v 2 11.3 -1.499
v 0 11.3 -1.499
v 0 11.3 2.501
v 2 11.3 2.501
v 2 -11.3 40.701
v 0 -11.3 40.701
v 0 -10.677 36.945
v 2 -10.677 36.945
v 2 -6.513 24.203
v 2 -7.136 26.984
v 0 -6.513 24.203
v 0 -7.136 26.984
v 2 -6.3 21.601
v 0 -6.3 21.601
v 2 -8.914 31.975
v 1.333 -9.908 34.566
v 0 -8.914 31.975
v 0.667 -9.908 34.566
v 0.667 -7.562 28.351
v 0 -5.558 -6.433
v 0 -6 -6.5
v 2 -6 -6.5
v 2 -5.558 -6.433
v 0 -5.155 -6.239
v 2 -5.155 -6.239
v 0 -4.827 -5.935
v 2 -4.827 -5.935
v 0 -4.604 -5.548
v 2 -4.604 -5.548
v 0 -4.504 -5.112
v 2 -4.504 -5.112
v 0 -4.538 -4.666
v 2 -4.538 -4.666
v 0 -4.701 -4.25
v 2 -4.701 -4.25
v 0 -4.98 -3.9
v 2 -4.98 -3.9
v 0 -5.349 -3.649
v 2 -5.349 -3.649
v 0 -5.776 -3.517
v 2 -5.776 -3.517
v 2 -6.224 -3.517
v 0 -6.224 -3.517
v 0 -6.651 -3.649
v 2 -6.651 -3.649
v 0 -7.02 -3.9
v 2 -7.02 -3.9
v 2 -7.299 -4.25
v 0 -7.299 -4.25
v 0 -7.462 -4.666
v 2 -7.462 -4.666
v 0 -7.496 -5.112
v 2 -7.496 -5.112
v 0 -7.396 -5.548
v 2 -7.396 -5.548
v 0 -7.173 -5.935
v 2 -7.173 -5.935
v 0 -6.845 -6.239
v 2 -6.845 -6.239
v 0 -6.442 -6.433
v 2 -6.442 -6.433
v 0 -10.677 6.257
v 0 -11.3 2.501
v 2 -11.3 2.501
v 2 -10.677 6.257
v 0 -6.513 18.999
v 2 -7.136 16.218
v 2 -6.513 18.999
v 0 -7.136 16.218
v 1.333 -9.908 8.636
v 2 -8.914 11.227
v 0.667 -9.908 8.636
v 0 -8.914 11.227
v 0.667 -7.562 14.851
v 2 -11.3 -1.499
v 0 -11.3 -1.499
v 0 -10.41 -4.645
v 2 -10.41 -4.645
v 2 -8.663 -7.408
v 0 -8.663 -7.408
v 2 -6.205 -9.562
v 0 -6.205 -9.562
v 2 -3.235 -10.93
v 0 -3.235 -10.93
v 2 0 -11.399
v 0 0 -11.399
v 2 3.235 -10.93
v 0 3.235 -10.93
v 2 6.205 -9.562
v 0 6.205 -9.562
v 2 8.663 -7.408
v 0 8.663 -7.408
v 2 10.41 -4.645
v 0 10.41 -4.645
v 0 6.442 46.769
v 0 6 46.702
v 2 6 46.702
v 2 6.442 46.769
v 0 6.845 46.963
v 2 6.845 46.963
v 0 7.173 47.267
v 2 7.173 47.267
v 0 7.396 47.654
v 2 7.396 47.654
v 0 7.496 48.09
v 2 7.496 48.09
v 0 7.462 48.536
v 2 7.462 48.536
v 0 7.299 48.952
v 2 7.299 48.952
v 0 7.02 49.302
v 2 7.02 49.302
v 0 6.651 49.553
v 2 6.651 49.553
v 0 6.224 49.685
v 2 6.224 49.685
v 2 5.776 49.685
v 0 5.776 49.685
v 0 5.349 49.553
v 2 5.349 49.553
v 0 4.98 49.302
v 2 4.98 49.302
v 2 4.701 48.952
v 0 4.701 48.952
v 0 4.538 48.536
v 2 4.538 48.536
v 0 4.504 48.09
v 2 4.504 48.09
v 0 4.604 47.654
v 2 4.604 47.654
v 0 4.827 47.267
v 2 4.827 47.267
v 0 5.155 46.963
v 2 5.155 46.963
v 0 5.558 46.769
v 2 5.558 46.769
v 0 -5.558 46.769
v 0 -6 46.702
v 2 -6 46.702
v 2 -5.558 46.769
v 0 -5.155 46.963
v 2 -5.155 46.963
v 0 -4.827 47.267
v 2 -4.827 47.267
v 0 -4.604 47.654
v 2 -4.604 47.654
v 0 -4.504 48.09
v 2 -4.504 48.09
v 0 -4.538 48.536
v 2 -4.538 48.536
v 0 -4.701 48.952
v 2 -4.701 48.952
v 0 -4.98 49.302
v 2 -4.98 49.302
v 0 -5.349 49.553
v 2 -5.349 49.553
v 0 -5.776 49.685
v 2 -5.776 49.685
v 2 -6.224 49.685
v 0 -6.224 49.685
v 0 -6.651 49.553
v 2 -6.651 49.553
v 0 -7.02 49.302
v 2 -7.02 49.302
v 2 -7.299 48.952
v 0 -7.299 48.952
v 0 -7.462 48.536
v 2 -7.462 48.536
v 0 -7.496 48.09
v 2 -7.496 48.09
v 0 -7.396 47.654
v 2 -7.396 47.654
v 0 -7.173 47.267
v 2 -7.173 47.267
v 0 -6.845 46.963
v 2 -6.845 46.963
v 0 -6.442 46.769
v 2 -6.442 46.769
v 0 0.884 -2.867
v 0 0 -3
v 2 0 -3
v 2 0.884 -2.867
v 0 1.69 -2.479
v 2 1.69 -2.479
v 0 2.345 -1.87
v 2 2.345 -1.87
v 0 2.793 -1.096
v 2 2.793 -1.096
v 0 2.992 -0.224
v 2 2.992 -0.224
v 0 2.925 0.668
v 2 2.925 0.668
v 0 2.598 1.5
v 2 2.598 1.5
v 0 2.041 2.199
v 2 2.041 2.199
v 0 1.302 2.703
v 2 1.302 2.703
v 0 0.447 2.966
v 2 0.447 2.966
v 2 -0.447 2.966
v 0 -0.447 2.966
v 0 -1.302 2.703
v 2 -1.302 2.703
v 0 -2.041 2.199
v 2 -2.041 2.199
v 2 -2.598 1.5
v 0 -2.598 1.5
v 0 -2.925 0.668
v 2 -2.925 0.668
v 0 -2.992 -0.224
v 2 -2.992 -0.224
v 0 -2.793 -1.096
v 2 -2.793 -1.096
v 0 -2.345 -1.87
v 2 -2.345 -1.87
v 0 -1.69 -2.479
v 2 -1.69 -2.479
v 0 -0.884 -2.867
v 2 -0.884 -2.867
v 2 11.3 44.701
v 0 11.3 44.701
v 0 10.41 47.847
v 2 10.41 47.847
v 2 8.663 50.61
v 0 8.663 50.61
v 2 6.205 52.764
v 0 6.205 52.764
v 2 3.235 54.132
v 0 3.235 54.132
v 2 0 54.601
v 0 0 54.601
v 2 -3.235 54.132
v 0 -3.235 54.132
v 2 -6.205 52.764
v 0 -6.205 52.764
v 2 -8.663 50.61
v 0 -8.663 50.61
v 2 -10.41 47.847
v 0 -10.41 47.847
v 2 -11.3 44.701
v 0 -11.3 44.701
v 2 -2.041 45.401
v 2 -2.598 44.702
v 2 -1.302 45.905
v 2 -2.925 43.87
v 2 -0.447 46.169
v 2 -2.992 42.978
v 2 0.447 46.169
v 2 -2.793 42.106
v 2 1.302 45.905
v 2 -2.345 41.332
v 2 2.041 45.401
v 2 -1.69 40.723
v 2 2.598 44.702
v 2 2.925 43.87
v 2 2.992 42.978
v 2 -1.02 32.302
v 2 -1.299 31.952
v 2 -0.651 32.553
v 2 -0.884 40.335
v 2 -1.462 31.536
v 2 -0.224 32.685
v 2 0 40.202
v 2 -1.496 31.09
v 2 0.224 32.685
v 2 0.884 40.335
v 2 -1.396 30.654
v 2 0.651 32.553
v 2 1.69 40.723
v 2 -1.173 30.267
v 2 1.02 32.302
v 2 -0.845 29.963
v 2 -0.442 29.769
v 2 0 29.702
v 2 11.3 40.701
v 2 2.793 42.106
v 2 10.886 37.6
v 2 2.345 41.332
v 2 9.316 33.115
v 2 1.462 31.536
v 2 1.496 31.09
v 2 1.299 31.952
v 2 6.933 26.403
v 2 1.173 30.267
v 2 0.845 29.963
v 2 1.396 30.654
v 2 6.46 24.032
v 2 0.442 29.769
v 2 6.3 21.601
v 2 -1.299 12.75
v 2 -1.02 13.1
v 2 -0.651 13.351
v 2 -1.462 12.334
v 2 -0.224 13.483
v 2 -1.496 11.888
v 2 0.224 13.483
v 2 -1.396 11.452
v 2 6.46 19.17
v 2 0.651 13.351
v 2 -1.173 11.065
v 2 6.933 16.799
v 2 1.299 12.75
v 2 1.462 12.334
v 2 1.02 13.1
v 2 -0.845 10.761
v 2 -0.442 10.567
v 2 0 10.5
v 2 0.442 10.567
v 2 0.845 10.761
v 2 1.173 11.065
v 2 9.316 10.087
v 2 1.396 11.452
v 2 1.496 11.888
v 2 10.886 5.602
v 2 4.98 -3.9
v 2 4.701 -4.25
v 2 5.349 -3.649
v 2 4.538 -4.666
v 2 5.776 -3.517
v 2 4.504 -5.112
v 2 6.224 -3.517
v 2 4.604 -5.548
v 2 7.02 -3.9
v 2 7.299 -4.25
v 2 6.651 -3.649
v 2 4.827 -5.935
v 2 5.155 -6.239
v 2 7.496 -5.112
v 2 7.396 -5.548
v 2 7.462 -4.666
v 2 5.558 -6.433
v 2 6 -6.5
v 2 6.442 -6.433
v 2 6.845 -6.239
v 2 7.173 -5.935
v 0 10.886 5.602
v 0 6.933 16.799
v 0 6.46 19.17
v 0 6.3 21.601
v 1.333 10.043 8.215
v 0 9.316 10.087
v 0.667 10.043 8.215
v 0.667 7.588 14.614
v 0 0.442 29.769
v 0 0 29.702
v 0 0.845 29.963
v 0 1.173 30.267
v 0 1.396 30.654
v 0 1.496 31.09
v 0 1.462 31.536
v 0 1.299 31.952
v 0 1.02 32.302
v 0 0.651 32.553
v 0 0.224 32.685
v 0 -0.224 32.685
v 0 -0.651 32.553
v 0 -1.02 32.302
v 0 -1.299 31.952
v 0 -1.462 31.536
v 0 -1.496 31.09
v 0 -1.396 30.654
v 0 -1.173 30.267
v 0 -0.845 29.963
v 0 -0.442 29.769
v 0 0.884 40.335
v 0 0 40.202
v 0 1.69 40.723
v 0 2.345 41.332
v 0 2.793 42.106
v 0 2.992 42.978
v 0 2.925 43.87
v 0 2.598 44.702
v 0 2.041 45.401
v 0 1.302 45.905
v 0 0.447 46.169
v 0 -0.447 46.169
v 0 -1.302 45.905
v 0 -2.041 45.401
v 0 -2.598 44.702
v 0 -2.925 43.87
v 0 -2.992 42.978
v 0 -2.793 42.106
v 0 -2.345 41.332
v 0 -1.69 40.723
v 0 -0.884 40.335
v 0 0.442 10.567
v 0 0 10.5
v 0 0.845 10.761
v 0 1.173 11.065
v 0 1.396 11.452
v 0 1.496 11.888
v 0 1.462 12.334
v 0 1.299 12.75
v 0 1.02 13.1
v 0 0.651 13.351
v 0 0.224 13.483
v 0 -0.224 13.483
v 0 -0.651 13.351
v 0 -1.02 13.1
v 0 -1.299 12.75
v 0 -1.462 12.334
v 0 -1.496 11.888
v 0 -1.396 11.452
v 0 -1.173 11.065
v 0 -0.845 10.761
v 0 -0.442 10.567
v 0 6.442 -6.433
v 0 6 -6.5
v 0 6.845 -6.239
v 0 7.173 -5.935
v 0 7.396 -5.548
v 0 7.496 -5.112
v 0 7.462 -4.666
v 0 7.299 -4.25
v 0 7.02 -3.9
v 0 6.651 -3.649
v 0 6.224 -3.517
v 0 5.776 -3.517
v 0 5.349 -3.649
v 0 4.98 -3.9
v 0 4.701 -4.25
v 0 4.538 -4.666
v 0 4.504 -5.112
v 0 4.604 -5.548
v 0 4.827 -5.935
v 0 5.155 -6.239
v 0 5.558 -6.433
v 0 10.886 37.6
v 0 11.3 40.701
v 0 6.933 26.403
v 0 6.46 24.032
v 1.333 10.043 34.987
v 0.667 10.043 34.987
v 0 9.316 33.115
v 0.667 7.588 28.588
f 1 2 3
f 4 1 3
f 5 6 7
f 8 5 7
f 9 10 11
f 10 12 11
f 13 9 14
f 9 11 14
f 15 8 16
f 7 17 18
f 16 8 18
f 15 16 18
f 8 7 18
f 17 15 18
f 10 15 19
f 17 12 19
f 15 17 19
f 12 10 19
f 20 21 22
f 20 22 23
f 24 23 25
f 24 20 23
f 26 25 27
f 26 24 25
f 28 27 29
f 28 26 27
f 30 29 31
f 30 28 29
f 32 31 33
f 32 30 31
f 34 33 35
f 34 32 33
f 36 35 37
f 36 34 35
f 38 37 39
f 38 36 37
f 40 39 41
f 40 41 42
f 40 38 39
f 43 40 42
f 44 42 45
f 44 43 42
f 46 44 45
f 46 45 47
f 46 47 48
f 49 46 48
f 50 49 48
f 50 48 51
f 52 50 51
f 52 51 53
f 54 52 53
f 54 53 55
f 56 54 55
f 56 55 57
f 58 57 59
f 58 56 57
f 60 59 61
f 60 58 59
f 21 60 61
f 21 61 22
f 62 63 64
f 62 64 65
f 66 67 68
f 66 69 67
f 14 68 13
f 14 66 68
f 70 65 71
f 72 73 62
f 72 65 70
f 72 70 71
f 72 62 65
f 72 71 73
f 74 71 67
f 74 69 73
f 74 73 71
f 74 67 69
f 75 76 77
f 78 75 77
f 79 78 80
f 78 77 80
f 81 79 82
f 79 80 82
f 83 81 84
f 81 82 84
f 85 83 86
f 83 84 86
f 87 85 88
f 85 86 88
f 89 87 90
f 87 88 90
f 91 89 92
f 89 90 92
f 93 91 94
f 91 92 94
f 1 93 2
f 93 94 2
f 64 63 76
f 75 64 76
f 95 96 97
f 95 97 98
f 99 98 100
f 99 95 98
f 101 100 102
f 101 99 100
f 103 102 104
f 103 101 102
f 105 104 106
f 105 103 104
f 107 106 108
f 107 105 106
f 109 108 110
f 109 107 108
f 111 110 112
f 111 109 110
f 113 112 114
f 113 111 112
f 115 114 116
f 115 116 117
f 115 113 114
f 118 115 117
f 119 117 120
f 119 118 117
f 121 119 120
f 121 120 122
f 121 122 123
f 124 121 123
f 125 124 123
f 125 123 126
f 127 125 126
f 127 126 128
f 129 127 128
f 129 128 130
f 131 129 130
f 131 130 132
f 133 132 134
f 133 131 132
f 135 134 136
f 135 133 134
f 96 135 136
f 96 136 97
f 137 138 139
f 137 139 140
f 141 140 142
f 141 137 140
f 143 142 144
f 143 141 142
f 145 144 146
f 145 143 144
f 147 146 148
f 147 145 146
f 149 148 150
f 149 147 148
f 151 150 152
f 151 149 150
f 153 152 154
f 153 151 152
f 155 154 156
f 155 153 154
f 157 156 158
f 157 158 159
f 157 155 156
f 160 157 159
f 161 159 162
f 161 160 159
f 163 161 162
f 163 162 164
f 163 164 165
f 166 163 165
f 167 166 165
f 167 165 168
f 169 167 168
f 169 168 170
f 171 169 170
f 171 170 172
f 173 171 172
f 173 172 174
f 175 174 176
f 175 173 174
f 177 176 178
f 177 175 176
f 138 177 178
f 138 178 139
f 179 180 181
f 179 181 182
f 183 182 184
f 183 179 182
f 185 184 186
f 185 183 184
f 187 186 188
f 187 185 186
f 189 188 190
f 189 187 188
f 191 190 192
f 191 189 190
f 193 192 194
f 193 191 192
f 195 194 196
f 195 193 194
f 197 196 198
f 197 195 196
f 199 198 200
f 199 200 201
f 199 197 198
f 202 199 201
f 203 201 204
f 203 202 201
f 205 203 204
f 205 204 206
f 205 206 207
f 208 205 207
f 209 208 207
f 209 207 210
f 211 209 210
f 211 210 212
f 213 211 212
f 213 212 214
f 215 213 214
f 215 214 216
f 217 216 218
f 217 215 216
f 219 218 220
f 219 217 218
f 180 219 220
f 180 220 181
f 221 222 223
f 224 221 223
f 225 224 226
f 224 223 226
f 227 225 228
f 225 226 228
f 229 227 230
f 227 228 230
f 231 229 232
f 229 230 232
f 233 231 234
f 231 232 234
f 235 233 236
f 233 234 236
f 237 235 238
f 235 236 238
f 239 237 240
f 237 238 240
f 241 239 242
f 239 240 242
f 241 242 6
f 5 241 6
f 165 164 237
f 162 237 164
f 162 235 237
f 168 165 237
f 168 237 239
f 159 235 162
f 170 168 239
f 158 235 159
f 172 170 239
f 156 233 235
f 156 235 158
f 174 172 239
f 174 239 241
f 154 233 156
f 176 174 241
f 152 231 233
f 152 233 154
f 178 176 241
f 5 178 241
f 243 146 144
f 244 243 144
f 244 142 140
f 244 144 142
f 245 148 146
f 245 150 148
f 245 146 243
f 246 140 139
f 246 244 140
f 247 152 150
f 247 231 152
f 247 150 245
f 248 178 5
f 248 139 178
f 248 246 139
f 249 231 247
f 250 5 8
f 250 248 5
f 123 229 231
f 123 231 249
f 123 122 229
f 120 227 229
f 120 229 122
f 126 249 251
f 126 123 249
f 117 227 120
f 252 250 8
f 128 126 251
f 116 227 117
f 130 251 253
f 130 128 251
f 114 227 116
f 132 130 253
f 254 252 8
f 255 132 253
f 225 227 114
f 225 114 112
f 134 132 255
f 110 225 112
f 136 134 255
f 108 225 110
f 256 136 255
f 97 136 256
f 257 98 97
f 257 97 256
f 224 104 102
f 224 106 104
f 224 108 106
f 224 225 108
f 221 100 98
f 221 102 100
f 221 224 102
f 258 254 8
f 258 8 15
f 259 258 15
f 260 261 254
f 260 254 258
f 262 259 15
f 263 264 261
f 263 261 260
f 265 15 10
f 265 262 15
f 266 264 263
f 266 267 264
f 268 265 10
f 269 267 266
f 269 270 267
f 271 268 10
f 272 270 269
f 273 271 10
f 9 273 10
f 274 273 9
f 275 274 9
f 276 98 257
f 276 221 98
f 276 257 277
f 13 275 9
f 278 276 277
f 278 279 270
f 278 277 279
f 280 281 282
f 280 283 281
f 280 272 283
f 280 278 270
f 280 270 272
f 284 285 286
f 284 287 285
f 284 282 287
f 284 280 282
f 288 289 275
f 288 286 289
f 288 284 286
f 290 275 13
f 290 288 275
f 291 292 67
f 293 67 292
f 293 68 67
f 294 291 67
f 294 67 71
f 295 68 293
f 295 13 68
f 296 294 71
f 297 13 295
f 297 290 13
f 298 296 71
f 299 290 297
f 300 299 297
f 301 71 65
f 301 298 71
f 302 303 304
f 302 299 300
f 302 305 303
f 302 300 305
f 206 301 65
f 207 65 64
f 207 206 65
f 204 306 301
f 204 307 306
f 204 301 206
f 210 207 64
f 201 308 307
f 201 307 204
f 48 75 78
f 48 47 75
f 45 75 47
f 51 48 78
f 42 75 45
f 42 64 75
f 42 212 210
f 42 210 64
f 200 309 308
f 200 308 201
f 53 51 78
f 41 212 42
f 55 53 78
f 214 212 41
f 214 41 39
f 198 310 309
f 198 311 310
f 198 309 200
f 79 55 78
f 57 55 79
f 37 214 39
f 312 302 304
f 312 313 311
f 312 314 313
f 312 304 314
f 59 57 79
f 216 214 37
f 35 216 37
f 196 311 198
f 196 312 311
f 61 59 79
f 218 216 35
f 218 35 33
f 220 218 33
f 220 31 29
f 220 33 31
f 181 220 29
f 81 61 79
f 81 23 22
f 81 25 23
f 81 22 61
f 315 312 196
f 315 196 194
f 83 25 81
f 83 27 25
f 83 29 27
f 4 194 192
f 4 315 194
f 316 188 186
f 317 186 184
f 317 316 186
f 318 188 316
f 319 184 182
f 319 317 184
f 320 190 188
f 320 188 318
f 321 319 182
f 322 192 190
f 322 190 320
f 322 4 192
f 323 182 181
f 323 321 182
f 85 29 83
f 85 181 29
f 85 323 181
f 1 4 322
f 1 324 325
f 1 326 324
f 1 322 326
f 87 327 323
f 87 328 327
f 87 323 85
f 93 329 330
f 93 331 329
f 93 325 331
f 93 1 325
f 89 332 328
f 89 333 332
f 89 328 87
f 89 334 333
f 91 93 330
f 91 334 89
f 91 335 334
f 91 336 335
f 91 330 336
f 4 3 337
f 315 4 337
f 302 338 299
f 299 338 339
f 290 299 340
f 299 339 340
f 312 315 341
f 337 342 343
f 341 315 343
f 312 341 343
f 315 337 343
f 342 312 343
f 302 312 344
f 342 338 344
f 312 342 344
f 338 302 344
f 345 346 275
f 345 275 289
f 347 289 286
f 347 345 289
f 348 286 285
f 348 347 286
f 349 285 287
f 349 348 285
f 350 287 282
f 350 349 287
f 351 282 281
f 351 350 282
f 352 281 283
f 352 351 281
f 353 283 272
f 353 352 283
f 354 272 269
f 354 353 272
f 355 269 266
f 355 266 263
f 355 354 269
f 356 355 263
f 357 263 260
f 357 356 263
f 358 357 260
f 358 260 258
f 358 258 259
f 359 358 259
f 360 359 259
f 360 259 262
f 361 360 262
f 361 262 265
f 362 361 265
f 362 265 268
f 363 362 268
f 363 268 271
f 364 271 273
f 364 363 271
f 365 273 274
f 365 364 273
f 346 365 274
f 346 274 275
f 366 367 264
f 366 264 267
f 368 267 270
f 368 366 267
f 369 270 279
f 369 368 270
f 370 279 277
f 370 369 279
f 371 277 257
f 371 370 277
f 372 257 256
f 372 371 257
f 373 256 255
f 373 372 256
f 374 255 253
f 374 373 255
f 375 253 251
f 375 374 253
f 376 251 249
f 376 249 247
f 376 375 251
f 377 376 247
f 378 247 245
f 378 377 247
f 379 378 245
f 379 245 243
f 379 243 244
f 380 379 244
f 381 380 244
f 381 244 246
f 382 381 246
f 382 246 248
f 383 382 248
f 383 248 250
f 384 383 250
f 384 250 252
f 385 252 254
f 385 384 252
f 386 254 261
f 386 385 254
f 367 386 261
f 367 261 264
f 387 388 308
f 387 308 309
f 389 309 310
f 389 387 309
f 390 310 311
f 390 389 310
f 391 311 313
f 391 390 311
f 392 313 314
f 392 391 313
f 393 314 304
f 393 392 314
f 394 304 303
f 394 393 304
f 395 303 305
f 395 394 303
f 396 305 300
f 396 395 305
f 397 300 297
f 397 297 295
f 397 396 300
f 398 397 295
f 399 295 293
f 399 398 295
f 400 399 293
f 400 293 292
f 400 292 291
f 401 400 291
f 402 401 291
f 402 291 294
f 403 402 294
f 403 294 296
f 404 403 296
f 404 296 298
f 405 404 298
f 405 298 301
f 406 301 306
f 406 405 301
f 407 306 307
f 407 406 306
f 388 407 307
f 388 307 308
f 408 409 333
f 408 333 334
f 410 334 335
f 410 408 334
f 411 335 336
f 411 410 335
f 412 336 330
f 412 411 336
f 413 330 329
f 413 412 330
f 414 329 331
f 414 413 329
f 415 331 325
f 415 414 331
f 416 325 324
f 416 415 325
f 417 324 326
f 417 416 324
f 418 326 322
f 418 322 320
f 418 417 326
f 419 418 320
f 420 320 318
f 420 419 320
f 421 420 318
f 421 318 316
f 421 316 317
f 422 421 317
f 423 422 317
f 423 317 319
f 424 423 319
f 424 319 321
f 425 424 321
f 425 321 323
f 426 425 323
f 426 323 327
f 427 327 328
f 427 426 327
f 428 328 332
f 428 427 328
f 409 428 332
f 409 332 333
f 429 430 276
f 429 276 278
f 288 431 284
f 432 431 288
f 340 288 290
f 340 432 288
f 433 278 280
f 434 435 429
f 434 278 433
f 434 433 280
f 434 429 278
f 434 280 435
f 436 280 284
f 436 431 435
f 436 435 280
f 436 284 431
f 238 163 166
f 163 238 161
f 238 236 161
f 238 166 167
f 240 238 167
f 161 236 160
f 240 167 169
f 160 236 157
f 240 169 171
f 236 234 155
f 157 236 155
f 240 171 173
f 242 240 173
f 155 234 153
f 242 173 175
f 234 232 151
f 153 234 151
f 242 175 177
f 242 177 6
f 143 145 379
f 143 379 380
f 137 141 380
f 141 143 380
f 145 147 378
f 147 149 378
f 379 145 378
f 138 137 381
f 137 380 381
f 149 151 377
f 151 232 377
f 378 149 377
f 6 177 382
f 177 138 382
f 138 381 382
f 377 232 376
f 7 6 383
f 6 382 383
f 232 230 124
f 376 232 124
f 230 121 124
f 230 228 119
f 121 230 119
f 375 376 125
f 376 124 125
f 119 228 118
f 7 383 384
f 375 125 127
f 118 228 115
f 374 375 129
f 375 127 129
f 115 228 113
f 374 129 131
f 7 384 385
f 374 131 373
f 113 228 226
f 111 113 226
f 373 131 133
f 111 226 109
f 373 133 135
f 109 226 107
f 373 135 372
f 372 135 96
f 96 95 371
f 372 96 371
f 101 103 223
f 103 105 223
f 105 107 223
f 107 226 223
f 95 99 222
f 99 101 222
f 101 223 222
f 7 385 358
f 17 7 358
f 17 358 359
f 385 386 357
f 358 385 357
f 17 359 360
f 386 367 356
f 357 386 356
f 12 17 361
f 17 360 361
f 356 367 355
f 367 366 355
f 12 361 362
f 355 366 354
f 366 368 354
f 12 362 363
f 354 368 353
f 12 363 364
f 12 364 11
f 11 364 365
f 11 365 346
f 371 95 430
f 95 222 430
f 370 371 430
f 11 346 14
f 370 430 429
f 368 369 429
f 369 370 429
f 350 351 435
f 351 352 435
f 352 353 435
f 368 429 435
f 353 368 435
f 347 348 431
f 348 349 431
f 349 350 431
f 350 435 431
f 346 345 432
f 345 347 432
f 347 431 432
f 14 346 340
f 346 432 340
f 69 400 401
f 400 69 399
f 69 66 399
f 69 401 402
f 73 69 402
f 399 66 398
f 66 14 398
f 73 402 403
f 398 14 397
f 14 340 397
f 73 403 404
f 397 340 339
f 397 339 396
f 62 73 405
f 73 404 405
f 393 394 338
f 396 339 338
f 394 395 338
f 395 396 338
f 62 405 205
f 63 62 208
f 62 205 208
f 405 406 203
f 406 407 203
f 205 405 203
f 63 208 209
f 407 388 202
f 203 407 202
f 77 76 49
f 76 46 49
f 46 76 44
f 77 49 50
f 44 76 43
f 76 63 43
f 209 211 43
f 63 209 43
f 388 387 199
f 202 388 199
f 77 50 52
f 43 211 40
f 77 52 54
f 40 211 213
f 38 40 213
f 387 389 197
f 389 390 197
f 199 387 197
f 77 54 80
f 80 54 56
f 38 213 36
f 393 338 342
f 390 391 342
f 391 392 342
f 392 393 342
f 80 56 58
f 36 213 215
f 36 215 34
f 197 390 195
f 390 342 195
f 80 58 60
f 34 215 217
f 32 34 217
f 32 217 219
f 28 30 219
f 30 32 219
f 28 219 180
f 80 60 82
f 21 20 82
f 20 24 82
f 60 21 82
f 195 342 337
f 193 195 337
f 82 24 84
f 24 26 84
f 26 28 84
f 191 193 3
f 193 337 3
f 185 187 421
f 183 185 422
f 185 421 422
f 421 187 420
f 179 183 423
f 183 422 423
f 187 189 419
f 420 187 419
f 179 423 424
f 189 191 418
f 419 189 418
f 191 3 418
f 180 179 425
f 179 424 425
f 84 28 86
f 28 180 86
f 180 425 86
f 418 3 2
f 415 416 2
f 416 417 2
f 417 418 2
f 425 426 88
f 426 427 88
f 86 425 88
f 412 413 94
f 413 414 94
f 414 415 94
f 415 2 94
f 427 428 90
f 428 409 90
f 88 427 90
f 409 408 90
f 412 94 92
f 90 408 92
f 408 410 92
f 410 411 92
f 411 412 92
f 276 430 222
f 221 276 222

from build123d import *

# Parameters (mm, degrees)
SCHIZZO1_R                   = 1.5
SCHIZZO1_R_2                 = 3
ESTRUSIONE_ESTRUSIONE1_DEPTH = 2


with BuildPart() as part:
    # Schizzo1 → Estrusione-Estrusione1 (new body)
    with BuildSketch(Plane(origin=(0, 0, 0), x_dir=(0, 0, -1), z_dir=(1, 0, 0))):
        with BuildLine():
            Line((-2.501010101, -11.3), (1.498989899, -11.3))
            ThreePointArc((1.498989899, -11.3), (11.398989899, 0), (1.498989899, 11.3))
            Line((1.498989899, 11.3), (-2.501010101, 11.3))
            add(Edge.make_bspline(
                [(-2.501010101, 11.3), (-7.839898951, 11.429610053), (-14.35178918, 6.216652626), (-21.601010101, 6.3)],
                knots=[0, 0, 0, 0, 1, 1, 1, 1], degree=3))
            add(Edge.make_bspline(
                [(-40.701010101, 11.3), (-35.362121251, 11.429610053), (-28.850231022, 6.216652626), (-21.601010101, 6.3)],
                knots=[0, 0, 0, 0, 1, 1, 1, 1], degree=3))
            Line((-40.701010101, 11.3), (-44.701010101, 11.3))
            ThreePointArc((-44.701010101, 11.3), (-54.601010101, 0), (-44.701010101, -11.3))
            Line((-44.701010101, -11.3), (-40.701010101, -11.3))
            add(Edge.make_bspline(
                [(-40.701010101, -11.3), (-34.455779635, -11.063584615), (-28.769360616, -6.33994929), (-21.601010101, -6.3)],
                knots=[0, 0, 0, 0, 1, 1, 1, 1], degree=3))
            add(Edge.make_bspline(
                [(-2.501010101, -11.3), (-8.746240567, -11.063584615), (-14.432659586, -6.33994929), (-21.601010101, -6.3)],
                knots=[0, 0, 0, 0, 1, 1, 1, 1], degree=3))
        make_face()
        with Locations((-48.202020202, 6)):
            Circle(SCHIZZO1_R, mode=Mode.SUBTRACT)
        with Locations((-48.202020202, -6)):
            Circle(SCHIZZO1_R, mode=Mode.SUBTRACT)
        with Locations((-31.202020202, 0)):
            Circle(SCHIZZO1_R, mode=Mode.SUBTRACT)
        with Locations((-12, 0)):
            Circle(SCHIZZO1_R, mode=Mode.SUBTRACT)
        with Locations((5, 6)):
            Circle(SCHIZZO1_R, mode=Mode.SUBTRACT)
        with Locations((5, -6)):
            Circle(SCHIZZO1_R, mode=Mode.SUBTRACT)
        with Locations((-43.202020202, 0)):
            Circle(SCHIZZO1_R_2, mode=Mode.SUBTRACT)
        Circle(SCHIZZO1_R_2, mode=Mode.SUBTRACT)
    extrude(amount=ESTRUSIONE_ESTRUSIONE1_DEPTH)


solid = part.part
